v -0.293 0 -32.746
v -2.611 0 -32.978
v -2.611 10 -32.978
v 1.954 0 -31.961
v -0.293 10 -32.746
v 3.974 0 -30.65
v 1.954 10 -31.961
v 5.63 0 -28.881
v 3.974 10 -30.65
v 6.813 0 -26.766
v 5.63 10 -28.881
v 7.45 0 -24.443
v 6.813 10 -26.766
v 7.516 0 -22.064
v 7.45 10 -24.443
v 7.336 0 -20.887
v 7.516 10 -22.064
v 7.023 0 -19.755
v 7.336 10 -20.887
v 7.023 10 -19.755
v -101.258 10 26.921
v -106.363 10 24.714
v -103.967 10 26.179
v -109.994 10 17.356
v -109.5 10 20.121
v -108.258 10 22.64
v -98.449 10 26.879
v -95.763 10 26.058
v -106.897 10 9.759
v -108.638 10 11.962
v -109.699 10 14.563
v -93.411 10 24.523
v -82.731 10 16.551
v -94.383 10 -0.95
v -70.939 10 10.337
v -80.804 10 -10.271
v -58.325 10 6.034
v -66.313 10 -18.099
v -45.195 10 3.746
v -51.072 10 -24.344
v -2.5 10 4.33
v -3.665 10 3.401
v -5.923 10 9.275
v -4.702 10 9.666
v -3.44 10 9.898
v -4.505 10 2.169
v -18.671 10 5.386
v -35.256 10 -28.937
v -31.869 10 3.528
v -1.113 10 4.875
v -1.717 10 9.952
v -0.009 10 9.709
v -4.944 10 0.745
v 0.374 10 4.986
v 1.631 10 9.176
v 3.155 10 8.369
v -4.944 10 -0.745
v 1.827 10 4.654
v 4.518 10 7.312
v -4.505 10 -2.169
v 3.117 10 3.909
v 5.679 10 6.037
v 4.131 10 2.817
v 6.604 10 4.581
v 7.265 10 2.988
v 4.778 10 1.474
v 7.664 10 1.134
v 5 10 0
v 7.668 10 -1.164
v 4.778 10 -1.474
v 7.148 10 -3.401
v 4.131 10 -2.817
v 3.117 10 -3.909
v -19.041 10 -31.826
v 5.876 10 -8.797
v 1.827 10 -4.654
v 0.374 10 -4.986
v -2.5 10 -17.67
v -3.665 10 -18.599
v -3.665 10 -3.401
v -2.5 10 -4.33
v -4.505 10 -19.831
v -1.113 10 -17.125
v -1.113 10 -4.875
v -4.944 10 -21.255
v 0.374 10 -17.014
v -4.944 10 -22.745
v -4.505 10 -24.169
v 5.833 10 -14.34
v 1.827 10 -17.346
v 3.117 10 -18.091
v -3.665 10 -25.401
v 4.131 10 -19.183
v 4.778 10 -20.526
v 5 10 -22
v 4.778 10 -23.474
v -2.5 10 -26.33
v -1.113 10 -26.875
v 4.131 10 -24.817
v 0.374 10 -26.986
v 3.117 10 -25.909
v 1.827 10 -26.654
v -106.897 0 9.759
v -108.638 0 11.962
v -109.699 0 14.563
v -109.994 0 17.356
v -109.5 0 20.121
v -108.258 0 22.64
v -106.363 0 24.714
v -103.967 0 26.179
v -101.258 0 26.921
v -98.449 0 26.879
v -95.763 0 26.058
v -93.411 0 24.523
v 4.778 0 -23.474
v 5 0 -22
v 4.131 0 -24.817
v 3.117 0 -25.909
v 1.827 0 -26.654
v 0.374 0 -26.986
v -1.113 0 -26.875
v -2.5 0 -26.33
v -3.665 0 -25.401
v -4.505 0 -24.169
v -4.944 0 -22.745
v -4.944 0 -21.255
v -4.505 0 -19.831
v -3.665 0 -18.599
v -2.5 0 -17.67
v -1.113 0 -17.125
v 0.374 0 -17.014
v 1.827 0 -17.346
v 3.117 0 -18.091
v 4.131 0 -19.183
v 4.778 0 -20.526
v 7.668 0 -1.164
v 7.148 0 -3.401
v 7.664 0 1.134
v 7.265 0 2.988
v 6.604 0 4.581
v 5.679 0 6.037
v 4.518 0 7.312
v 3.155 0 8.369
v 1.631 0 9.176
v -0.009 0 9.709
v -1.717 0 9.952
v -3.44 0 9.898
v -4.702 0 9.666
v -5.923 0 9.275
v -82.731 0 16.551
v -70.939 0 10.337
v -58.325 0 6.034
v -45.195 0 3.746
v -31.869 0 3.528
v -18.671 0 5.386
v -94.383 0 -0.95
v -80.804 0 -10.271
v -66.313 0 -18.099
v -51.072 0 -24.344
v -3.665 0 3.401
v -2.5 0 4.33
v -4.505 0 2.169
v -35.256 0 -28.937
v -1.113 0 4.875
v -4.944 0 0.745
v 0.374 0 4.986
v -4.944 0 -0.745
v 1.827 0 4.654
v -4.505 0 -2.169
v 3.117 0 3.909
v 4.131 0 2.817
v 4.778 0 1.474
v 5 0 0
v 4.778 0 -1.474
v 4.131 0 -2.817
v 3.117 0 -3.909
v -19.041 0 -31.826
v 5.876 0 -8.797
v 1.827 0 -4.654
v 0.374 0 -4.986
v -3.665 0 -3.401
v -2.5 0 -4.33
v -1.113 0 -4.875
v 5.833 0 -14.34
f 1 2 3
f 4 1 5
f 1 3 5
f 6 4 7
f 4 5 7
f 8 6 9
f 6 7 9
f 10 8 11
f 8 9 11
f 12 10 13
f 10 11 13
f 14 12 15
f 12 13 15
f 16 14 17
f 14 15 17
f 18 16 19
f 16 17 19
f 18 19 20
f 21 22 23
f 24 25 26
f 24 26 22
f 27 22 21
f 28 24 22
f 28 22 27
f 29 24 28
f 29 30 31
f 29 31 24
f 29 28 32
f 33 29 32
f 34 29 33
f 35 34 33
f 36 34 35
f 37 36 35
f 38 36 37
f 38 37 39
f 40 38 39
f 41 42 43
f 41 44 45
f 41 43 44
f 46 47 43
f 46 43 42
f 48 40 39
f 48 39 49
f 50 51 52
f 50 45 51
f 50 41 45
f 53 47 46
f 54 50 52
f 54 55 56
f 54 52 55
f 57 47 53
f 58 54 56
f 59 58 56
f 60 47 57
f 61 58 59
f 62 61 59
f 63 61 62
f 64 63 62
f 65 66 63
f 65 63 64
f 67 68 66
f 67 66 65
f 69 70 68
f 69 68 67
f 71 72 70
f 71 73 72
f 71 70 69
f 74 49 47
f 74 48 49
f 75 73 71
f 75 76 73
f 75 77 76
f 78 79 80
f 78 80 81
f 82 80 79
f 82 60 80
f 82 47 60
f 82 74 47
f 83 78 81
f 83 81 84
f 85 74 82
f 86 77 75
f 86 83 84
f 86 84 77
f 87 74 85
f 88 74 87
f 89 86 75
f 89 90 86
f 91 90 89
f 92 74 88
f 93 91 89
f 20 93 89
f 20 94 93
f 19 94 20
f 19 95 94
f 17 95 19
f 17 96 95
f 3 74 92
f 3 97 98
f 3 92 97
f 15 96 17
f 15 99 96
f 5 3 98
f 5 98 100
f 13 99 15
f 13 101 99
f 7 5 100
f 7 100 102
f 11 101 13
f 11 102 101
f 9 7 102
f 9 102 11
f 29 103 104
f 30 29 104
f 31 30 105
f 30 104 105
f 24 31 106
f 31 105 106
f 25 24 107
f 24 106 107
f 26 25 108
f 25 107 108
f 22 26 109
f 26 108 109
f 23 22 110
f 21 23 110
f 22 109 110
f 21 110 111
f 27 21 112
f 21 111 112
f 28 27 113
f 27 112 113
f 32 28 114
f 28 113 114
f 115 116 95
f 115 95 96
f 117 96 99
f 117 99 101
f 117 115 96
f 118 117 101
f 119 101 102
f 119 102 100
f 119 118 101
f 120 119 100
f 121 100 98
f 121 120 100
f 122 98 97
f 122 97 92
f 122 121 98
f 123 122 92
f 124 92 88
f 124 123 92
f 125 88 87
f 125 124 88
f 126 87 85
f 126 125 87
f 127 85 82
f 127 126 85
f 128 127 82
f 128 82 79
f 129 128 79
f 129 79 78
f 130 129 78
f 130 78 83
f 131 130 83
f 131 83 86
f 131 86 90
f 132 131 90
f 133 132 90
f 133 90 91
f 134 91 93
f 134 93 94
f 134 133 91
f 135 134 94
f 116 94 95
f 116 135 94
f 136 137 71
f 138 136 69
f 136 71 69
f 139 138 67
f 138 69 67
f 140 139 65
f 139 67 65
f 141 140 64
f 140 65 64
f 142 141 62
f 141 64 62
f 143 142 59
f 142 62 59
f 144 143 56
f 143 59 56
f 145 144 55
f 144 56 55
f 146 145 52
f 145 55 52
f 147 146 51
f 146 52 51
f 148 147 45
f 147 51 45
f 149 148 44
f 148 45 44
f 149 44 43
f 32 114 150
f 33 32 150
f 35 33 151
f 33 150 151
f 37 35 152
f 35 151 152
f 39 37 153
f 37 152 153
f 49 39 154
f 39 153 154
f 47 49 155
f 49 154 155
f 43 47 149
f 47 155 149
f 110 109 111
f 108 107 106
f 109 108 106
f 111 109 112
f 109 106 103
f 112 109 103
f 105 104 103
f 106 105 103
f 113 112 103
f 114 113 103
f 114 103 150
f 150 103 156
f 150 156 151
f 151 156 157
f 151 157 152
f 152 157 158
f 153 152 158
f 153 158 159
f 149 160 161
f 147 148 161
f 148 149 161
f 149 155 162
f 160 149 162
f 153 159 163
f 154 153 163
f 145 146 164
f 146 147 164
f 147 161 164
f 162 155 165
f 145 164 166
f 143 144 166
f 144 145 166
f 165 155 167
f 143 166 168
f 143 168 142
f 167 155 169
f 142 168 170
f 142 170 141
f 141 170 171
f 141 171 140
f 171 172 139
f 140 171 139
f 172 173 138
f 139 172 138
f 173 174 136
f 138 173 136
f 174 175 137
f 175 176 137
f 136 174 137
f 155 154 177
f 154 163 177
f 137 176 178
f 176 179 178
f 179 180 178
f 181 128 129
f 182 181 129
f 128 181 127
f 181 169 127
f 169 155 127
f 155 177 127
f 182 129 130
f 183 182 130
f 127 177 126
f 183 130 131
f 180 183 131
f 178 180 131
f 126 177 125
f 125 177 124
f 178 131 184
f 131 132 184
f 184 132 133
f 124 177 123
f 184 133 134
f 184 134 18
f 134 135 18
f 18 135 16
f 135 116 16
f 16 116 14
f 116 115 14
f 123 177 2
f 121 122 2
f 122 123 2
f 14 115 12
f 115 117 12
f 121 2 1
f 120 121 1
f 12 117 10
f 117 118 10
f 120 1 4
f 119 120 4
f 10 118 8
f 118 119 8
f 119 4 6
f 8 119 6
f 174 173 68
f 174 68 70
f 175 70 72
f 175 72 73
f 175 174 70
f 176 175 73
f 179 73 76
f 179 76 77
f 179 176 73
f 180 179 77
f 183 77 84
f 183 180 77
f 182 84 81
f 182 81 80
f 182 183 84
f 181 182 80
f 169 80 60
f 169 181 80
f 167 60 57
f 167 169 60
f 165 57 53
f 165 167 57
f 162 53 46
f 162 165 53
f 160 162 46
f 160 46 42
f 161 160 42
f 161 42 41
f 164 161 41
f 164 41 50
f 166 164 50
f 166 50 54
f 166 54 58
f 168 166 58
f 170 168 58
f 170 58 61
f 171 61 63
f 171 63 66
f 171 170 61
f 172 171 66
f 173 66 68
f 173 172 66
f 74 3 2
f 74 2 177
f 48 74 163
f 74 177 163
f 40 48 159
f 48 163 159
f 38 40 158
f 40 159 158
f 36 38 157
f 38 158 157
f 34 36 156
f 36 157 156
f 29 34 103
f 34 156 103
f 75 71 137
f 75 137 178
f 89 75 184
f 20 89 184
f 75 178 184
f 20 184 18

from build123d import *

# Parameters (mm, degrees)
SKETCH1_R           = 5
BOSS_EXTRUDE1_DEPTH = 10
FILLET1_R           = 10


with BuildPart() as part:
    # Sketch1 → Boss-Extrude1 (new body)
    with BuildSketch(Plane(origin=(0, 0, 0), x_dir=(1, 0, 0), z_dir=(0, 1, 0))):
        with BuildLine():
            ThreePointArc((10.228609777, 26.046670488), (6.184117748, 31.09707028), (0, 33))
            ThreePointArc((0, 33), (-57.565554835, 21.913887087), (-106.896551724, -9.75862069))
            ThreePointArc((-106.896551724, -9.75862069), (-107.383655881, -23.74400666), (-93.411472897, -24.522719629))
            ThreePointArc((-93.411472897, -24.522719629), (-50.8758669, -4.476742461), (-4.17684665, -9.983146536))
            ThreePointArc((-4.17684665, -9.983146536), (4.753191306, -9.721956341), (10.443773705, -2.834934477))
            ThreePointArc((10.443773705, -2.834934477), (5.699126861, 11.571322519), (10.228609777, 26.046670488))
        make_face()
        Circle(SKETCH1_R, mode=Mode.SUBTRACT)
        with Locations((0, 22)):
            Circle(SKETCH1_R, mode=Mode.SUBTRACT)
    extrude(amount=BOSS_EXTRUDE1_DEPTH)

    # Fillet1
    fillet1_edges = [part.edges().sort_by_distance(p)[0] for p in [
        (10.443773705, 5, 2.834934477),
        (10.228609777, 5, -26.046670488),
    ]]
    fillet(fillet1_edges, radius=FILLET1_R)


solid = part.part
